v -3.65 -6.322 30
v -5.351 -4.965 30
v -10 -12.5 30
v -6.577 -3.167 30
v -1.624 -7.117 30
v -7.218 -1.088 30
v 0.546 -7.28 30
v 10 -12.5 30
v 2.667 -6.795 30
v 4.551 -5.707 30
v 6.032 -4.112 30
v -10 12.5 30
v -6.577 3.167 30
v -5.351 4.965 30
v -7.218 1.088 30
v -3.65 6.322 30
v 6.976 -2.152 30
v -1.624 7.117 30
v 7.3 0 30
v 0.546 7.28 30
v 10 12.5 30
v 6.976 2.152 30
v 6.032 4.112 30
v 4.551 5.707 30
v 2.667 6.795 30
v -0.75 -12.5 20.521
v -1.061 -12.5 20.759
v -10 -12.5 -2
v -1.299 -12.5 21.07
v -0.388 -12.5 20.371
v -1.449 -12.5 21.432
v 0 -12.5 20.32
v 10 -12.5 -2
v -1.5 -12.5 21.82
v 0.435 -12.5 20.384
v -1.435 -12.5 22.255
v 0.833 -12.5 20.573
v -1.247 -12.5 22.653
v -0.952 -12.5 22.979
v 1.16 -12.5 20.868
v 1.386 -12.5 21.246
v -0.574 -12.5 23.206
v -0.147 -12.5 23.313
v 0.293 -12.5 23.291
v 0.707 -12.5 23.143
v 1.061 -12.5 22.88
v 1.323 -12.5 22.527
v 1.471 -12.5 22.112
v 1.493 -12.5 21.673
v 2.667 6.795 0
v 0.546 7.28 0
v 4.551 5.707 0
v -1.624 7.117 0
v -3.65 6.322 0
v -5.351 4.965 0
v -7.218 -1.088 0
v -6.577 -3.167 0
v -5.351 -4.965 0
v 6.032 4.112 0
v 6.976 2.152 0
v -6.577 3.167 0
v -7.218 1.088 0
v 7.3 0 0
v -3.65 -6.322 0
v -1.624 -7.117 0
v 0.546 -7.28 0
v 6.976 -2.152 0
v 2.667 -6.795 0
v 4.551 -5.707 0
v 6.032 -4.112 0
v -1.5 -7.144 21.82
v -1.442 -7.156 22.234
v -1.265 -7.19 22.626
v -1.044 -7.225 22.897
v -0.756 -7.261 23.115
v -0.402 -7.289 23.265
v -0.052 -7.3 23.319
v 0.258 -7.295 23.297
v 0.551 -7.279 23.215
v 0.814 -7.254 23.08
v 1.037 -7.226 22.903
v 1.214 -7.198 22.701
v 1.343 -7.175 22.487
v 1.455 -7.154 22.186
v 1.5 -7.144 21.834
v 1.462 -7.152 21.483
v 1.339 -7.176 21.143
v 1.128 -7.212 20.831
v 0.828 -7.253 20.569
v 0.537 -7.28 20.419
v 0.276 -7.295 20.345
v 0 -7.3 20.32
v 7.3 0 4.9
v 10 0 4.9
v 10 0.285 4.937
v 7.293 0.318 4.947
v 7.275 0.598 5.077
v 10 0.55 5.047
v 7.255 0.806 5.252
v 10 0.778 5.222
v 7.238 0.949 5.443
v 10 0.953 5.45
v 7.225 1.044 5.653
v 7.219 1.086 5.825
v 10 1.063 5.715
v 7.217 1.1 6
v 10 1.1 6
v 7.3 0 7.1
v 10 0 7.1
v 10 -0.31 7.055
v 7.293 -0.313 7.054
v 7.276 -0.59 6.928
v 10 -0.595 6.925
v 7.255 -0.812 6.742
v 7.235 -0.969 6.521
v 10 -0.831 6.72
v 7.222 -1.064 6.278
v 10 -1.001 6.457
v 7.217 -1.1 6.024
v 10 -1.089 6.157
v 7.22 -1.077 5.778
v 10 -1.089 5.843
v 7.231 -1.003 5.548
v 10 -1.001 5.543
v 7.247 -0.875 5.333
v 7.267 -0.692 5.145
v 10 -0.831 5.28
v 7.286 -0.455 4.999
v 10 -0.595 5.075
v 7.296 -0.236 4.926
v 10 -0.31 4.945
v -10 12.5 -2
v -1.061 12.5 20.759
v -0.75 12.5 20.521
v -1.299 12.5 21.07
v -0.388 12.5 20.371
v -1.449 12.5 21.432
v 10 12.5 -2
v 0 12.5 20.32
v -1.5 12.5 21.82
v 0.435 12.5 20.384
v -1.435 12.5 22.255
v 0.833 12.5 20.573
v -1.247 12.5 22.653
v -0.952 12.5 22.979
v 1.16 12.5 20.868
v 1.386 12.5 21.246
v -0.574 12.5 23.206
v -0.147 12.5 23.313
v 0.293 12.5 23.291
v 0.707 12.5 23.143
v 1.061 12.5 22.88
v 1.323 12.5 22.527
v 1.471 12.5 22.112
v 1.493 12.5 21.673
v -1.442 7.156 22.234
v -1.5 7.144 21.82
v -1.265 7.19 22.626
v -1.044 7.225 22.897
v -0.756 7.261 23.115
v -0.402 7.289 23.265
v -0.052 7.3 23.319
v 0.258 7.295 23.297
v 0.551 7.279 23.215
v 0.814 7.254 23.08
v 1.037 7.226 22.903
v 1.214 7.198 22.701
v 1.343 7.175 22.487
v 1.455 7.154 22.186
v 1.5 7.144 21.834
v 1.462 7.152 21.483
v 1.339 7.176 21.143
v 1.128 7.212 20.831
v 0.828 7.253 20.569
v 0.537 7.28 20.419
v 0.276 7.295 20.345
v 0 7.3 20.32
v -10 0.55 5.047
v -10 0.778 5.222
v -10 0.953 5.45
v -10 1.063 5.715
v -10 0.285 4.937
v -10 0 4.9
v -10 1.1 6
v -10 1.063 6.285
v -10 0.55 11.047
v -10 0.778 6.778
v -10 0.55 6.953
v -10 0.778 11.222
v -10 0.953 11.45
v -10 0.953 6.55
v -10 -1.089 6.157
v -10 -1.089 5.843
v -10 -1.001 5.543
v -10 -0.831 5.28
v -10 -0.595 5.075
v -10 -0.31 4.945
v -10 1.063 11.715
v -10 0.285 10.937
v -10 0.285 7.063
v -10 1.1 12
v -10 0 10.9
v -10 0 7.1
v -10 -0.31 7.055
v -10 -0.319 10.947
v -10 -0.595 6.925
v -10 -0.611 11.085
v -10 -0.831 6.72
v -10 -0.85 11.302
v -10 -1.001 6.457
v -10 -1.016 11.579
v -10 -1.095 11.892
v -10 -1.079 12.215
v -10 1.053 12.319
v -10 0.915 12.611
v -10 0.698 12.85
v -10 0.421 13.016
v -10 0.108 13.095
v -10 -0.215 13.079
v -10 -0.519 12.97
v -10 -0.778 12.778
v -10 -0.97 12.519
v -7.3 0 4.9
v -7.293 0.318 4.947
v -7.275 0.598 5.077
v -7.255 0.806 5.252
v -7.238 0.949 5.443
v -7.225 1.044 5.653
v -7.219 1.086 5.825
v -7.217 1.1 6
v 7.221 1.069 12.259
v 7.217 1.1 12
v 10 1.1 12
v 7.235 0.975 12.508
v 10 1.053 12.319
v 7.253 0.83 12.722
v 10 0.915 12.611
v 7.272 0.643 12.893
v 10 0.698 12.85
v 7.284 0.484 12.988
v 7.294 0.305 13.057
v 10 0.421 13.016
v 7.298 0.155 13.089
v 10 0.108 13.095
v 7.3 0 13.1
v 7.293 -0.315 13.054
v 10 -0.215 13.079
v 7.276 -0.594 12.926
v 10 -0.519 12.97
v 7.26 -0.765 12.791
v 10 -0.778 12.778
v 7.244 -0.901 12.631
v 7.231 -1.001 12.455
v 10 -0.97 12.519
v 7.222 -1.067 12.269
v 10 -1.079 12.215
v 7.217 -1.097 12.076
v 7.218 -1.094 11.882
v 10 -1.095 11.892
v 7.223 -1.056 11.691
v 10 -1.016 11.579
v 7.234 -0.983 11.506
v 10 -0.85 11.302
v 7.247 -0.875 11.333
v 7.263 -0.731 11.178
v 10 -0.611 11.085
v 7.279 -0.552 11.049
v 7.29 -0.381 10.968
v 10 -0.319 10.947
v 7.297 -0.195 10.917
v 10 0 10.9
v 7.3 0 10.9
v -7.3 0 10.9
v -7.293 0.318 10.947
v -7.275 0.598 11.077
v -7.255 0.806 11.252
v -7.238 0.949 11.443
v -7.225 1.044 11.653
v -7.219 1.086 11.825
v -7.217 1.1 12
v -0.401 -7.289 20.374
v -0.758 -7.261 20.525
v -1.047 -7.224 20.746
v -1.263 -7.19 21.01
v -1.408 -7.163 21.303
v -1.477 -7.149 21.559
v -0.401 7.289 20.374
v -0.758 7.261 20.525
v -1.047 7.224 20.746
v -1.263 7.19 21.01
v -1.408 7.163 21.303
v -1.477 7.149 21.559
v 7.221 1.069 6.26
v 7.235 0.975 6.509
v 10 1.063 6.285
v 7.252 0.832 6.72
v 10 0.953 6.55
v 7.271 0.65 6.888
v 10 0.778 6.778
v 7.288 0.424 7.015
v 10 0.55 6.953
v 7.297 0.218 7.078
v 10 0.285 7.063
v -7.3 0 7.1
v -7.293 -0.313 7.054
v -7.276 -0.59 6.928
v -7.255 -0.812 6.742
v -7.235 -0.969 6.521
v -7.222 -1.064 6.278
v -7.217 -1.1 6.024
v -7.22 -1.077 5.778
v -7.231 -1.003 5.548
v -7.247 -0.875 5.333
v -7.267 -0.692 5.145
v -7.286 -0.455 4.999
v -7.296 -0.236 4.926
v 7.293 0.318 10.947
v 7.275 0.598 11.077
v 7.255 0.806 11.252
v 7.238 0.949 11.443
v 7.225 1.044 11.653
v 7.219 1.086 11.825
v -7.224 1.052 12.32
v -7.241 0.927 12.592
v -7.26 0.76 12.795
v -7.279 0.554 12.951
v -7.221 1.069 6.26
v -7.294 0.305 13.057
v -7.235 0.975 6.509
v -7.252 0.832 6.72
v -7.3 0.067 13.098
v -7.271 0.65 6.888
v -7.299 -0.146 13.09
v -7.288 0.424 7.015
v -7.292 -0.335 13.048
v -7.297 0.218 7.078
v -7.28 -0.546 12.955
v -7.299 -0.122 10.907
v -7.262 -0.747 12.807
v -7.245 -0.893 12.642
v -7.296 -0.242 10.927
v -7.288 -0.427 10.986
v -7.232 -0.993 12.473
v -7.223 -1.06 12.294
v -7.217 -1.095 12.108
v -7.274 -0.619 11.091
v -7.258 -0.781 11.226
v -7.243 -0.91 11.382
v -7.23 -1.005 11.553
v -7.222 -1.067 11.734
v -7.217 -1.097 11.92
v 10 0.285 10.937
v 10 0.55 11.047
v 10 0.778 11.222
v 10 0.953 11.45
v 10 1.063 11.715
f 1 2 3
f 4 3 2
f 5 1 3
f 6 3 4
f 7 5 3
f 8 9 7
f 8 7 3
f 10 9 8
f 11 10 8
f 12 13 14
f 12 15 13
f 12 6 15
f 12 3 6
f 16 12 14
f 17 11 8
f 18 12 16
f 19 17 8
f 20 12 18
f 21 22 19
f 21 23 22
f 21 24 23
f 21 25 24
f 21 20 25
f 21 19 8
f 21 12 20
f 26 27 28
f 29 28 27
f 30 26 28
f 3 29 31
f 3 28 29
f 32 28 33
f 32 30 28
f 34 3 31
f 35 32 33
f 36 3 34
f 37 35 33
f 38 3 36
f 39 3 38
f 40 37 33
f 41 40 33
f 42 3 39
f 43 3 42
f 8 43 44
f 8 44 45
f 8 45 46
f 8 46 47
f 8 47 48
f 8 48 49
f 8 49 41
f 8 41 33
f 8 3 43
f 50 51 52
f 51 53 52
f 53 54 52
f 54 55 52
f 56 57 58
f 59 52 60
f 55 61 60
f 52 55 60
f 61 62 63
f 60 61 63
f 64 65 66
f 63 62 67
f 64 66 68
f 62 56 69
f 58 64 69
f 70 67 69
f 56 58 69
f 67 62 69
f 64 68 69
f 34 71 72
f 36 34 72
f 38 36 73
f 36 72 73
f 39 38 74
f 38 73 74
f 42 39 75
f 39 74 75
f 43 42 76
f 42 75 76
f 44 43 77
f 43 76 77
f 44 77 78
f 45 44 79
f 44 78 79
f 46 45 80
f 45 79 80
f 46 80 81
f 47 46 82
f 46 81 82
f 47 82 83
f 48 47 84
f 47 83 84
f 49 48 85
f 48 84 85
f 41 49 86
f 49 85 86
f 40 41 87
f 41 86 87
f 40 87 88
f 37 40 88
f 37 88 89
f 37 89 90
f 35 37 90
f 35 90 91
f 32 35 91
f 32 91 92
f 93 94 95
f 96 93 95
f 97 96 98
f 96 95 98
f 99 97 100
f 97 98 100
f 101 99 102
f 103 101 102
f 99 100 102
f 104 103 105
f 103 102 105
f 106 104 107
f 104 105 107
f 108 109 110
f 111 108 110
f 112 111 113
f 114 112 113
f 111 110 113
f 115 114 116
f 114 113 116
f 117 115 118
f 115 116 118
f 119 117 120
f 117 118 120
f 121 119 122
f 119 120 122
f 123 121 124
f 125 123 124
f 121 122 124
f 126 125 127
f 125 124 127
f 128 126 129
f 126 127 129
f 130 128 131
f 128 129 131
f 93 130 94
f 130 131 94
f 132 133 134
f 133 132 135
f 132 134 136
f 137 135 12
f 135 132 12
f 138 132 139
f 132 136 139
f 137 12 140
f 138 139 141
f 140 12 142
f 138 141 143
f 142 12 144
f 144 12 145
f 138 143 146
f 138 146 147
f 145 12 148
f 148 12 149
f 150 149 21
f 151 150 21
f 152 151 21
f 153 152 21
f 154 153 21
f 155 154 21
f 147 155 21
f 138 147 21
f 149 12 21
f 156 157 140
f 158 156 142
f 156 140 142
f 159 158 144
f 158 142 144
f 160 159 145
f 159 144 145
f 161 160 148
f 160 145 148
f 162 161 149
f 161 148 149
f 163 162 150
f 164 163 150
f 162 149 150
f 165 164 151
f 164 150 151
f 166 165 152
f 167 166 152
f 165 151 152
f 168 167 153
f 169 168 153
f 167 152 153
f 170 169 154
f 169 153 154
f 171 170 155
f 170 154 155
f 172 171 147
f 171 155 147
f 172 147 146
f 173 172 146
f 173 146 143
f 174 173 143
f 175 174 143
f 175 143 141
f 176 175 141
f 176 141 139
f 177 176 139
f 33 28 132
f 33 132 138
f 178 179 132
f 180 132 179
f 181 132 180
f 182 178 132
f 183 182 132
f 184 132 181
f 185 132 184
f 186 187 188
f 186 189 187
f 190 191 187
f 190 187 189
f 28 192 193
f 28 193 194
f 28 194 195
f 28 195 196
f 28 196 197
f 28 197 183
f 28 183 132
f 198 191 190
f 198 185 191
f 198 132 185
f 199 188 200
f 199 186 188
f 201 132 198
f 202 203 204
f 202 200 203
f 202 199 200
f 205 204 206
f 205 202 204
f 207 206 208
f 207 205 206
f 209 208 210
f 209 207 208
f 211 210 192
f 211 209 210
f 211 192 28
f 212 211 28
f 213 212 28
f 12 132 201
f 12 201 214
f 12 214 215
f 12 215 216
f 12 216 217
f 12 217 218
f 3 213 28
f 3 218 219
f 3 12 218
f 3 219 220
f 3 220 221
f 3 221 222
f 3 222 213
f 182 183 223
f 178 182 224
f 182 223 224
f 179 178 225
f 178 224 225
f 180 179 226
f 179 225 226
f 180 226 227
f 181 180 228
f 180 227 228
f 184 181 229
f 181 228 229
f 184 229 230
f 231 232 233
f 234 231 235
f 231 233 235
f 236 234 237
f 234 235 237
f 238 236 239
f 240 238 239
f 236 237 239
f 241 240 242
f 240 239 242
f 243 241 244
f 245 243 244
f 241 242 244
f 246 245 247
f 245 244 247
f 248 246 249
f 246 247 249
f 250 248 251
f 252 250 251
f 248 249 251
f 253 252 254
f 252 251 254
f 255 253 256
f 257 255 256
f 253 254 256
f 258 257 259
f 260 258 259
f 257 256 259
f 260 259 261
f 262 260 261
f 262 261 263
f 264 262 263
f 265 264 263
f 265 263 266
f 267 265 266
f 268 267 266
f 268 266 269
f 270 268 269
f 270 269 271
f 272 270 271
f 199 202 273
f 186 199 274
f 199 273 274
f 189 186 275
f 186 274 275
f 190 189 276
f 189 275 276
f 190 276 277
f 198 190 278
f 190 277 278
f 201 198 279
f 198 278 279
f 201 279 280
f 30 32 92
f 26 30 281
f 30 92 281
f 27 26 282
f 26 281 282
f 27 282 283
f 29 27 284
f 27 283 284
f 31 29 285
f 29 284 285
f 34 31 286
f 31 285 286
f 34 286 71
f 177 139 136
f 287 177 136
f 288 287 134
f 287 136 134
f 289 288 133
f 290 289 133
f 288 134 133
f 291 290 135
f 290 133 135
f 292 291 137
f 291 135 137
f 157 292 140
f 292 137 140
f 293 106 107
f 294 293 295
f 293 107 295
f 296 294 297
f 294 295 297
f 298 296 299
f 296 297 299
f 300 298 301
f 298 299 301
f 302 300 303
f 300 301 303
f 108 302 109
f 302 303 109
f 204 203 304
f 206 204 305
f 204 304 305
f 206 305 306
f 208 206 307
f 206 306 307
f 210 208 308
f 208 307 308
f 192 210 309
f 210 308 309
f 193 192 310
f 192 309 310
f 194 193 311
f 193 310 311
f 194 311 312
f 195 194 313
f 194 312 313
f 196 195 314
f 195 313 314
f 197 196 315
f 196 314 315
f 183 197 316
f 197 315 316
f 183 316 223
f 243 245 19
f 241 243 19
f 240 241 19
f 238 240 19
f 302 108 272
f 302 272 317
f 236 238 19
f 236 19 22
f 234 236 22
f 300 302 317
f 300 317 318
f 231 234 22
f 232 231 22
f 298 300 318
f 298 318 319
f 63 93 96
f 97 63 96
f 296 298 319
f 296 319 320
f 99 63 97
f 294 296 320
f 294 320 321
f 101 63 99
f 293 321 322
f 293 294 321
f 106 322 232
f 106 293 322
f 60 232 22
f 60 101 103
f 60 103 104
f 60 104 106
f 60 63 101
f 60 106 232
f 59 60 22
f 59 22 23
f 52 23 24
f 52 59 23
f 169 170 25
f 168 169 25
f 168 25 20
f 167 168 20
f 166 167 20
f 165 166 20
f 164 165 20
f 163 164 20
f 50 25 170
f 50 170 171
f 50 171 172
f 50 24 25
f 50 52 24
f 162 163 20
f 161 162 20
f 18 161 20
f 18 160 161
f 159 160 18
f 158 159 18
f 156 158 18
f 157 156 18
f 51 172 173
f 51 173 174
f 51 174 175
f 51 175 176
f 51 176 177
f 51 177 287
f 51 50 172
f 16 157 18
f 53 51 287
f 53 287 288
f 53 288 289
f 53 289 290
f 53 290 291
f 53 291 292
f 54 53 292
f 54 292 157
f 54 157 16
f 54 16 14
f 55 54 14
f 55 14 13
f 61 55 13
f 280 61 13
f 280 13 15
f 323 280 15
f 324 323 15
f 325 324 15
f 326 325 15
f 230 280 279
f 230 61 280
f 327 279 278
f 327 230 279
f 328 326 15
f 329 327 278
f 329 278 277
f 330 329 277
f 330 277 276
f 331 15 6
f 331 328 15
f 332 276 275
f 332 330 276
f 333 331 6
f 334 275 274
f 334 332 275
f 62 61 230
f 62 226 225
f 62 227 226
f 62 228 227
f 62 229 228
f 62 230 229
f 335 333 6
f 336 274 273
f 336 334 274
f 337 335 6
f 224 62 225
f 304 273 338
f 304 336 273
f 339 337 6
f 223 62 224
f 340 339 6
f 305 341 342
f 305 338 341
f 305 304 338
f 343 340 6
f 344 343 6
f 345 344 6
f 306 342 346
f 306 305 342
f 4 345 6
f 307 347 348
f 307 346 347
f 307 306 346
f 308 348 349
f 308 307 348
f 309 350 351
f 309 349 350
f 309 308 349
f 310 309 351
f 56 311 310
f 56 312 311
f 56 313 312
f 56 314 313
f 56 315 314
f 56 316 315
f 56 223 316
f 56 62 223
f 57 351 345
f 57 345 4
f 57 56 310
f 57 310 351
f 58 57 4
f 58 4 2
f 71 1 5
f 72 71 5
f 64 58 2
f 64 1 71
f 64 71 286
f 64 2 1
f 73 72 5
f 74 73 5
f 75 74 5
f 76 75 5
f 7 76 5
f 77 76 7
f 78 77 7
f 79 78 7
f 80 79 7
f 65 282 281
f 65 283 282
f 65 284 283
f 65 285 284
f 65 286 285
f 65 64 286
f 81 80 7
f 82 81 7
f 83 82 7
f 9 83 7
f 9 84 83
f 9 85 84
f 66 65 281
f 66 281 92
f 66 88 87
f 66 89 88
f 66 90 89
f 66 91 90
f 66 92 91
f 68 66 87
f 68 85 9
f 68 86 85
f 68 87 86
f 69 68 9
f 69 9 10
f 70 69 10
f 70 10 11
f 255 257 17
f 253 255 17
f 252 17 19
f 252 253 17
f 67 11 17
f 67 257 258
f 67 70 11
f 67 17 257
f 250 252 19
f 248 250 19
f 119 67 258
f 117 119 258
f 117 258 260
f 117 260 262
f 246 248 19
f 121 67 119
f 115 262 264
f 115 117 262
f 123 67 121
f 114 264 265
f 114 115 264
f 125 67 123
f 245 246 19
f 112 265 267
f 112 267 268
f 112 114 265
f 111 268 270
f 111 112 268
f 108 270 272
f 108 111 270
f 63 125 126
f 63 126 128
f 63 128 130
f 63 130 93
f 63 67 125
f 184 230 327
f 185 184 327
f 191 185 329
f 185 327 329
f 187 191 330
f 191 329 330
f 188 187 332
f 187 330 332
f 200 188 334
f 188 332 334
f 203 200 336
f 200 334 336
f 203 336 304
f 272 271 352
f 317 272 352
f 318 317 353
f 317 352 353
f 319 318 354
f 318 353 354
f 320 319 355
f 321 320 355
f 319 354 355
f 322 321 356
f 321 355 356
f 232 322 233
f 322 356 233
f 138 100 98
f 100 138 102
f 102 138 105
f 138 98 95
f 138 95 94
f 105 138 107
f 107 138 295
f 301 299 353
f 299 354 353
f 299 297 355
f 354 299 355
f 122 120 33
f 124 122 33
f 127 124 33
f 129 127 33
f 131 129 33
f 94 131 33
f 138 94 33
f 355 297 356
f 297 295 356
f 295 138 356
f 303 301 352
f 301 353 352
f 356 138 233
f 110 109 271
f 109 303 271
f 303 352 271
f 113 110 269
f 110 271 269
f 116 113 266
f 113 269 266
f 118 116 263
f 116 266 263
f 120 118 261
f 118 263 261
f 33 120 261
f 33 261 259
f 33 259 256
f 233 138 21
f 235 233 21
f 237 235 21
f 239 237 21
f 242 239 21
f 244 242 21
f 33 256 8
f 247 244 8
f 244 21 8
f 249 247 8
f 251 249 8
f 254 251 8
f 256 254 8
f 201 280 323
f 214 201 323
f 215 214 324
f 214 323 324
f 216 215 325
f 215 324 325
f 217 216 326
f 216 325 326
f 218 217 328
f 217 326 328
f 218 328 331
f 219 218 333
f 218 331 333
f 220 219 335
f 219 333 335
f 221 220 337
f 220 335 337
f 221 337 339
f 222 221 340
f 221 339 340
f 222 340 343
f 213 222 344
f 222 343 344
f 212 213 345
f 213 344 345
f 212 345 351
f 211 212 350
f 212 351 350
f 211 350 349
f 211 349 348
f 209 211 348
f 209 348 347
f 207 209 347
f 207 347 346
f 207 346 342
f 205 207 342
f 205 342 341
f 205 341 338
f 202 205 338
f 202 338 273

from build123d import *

# Parameters (mm, degrees)
F0_W     = 20
F0_H     = 25
F0_R     = 7.3
F1_DEPTH = 30
F3_DEPTH = 25
F5_DEPTH = 25.001
F6_W     = 20
F6_H     = 25
F7_DEPTH = 2


with BuildPart() as f1:
    # F0 (on Top) → F1 (new body)
    with BuildSketch(Plane.XY):
        Rectangle(F0_W, F0_H)
        Circle(F0_R, mode=Mode.SUBTRACT)
    extrude(amount=F1_DEPTH)

    # F2 (on face) → F3 (cut)
    with BuildSketch(Plane.YZ.offset(10)):
        with BuildLine():
            ThreePointArc((0, 7.1), (-1.1, 6), (0, 4.9))
            Line((0, 4.9), (0, 6))
            Line((0, 6), (0, 7.1))
        make_face()
        with BuildLine():
            ThreePointArc((1.1, 12), (-0.777817, 12.777817), (0, 10.9))
            ThreePointArc((0, 10.9), (0.777817, 11.222183), (1.1, 12))
        make_face()
        with BuildLine():
            Line((0, 6), (0, 4.9))
            ThreePointArc((0, 4.9), (0.777817, 5.222183), (1.1, 6))
            ThreePointArc((1.1, 6), (0.777817, 6.777817), (0, 7.1))
            Line((0, 7.1), (0, 6))
        make_face()
    extrude(amount=-F3_DEPTH, mode=Mode.SUBTRACT)

    # F4 (on face) → F5 (cut, through all)
    with BuildSketch(Plane(origin=(0, 12.5, 0), x_dir=(-1, 0, 0), z_dir=(0, 1, 0))):
        with BuildLine():
            ThreePointArc((0, 20.319805), (1.06066, 20.759145), (1.5, 21.819805))
            ThreePointArc((1.5, 21.819805), (-1.06066, 22.880465), (0, 20.319805))
        make_face()
    extrude(amount=-F5_DEPTH, mode=Mode.SUBTRACT)

    # F6 (on face) → F7 (join)
    with BuildSketch(Plane(origin=(0, 0, 0), x_dir=(1, 0, 0), z_dir=(0, 0, -1))):
        Rectangle(F6_W, F6_H)
    extrude(amount=F7_DEPTH)


solid = f1.part
